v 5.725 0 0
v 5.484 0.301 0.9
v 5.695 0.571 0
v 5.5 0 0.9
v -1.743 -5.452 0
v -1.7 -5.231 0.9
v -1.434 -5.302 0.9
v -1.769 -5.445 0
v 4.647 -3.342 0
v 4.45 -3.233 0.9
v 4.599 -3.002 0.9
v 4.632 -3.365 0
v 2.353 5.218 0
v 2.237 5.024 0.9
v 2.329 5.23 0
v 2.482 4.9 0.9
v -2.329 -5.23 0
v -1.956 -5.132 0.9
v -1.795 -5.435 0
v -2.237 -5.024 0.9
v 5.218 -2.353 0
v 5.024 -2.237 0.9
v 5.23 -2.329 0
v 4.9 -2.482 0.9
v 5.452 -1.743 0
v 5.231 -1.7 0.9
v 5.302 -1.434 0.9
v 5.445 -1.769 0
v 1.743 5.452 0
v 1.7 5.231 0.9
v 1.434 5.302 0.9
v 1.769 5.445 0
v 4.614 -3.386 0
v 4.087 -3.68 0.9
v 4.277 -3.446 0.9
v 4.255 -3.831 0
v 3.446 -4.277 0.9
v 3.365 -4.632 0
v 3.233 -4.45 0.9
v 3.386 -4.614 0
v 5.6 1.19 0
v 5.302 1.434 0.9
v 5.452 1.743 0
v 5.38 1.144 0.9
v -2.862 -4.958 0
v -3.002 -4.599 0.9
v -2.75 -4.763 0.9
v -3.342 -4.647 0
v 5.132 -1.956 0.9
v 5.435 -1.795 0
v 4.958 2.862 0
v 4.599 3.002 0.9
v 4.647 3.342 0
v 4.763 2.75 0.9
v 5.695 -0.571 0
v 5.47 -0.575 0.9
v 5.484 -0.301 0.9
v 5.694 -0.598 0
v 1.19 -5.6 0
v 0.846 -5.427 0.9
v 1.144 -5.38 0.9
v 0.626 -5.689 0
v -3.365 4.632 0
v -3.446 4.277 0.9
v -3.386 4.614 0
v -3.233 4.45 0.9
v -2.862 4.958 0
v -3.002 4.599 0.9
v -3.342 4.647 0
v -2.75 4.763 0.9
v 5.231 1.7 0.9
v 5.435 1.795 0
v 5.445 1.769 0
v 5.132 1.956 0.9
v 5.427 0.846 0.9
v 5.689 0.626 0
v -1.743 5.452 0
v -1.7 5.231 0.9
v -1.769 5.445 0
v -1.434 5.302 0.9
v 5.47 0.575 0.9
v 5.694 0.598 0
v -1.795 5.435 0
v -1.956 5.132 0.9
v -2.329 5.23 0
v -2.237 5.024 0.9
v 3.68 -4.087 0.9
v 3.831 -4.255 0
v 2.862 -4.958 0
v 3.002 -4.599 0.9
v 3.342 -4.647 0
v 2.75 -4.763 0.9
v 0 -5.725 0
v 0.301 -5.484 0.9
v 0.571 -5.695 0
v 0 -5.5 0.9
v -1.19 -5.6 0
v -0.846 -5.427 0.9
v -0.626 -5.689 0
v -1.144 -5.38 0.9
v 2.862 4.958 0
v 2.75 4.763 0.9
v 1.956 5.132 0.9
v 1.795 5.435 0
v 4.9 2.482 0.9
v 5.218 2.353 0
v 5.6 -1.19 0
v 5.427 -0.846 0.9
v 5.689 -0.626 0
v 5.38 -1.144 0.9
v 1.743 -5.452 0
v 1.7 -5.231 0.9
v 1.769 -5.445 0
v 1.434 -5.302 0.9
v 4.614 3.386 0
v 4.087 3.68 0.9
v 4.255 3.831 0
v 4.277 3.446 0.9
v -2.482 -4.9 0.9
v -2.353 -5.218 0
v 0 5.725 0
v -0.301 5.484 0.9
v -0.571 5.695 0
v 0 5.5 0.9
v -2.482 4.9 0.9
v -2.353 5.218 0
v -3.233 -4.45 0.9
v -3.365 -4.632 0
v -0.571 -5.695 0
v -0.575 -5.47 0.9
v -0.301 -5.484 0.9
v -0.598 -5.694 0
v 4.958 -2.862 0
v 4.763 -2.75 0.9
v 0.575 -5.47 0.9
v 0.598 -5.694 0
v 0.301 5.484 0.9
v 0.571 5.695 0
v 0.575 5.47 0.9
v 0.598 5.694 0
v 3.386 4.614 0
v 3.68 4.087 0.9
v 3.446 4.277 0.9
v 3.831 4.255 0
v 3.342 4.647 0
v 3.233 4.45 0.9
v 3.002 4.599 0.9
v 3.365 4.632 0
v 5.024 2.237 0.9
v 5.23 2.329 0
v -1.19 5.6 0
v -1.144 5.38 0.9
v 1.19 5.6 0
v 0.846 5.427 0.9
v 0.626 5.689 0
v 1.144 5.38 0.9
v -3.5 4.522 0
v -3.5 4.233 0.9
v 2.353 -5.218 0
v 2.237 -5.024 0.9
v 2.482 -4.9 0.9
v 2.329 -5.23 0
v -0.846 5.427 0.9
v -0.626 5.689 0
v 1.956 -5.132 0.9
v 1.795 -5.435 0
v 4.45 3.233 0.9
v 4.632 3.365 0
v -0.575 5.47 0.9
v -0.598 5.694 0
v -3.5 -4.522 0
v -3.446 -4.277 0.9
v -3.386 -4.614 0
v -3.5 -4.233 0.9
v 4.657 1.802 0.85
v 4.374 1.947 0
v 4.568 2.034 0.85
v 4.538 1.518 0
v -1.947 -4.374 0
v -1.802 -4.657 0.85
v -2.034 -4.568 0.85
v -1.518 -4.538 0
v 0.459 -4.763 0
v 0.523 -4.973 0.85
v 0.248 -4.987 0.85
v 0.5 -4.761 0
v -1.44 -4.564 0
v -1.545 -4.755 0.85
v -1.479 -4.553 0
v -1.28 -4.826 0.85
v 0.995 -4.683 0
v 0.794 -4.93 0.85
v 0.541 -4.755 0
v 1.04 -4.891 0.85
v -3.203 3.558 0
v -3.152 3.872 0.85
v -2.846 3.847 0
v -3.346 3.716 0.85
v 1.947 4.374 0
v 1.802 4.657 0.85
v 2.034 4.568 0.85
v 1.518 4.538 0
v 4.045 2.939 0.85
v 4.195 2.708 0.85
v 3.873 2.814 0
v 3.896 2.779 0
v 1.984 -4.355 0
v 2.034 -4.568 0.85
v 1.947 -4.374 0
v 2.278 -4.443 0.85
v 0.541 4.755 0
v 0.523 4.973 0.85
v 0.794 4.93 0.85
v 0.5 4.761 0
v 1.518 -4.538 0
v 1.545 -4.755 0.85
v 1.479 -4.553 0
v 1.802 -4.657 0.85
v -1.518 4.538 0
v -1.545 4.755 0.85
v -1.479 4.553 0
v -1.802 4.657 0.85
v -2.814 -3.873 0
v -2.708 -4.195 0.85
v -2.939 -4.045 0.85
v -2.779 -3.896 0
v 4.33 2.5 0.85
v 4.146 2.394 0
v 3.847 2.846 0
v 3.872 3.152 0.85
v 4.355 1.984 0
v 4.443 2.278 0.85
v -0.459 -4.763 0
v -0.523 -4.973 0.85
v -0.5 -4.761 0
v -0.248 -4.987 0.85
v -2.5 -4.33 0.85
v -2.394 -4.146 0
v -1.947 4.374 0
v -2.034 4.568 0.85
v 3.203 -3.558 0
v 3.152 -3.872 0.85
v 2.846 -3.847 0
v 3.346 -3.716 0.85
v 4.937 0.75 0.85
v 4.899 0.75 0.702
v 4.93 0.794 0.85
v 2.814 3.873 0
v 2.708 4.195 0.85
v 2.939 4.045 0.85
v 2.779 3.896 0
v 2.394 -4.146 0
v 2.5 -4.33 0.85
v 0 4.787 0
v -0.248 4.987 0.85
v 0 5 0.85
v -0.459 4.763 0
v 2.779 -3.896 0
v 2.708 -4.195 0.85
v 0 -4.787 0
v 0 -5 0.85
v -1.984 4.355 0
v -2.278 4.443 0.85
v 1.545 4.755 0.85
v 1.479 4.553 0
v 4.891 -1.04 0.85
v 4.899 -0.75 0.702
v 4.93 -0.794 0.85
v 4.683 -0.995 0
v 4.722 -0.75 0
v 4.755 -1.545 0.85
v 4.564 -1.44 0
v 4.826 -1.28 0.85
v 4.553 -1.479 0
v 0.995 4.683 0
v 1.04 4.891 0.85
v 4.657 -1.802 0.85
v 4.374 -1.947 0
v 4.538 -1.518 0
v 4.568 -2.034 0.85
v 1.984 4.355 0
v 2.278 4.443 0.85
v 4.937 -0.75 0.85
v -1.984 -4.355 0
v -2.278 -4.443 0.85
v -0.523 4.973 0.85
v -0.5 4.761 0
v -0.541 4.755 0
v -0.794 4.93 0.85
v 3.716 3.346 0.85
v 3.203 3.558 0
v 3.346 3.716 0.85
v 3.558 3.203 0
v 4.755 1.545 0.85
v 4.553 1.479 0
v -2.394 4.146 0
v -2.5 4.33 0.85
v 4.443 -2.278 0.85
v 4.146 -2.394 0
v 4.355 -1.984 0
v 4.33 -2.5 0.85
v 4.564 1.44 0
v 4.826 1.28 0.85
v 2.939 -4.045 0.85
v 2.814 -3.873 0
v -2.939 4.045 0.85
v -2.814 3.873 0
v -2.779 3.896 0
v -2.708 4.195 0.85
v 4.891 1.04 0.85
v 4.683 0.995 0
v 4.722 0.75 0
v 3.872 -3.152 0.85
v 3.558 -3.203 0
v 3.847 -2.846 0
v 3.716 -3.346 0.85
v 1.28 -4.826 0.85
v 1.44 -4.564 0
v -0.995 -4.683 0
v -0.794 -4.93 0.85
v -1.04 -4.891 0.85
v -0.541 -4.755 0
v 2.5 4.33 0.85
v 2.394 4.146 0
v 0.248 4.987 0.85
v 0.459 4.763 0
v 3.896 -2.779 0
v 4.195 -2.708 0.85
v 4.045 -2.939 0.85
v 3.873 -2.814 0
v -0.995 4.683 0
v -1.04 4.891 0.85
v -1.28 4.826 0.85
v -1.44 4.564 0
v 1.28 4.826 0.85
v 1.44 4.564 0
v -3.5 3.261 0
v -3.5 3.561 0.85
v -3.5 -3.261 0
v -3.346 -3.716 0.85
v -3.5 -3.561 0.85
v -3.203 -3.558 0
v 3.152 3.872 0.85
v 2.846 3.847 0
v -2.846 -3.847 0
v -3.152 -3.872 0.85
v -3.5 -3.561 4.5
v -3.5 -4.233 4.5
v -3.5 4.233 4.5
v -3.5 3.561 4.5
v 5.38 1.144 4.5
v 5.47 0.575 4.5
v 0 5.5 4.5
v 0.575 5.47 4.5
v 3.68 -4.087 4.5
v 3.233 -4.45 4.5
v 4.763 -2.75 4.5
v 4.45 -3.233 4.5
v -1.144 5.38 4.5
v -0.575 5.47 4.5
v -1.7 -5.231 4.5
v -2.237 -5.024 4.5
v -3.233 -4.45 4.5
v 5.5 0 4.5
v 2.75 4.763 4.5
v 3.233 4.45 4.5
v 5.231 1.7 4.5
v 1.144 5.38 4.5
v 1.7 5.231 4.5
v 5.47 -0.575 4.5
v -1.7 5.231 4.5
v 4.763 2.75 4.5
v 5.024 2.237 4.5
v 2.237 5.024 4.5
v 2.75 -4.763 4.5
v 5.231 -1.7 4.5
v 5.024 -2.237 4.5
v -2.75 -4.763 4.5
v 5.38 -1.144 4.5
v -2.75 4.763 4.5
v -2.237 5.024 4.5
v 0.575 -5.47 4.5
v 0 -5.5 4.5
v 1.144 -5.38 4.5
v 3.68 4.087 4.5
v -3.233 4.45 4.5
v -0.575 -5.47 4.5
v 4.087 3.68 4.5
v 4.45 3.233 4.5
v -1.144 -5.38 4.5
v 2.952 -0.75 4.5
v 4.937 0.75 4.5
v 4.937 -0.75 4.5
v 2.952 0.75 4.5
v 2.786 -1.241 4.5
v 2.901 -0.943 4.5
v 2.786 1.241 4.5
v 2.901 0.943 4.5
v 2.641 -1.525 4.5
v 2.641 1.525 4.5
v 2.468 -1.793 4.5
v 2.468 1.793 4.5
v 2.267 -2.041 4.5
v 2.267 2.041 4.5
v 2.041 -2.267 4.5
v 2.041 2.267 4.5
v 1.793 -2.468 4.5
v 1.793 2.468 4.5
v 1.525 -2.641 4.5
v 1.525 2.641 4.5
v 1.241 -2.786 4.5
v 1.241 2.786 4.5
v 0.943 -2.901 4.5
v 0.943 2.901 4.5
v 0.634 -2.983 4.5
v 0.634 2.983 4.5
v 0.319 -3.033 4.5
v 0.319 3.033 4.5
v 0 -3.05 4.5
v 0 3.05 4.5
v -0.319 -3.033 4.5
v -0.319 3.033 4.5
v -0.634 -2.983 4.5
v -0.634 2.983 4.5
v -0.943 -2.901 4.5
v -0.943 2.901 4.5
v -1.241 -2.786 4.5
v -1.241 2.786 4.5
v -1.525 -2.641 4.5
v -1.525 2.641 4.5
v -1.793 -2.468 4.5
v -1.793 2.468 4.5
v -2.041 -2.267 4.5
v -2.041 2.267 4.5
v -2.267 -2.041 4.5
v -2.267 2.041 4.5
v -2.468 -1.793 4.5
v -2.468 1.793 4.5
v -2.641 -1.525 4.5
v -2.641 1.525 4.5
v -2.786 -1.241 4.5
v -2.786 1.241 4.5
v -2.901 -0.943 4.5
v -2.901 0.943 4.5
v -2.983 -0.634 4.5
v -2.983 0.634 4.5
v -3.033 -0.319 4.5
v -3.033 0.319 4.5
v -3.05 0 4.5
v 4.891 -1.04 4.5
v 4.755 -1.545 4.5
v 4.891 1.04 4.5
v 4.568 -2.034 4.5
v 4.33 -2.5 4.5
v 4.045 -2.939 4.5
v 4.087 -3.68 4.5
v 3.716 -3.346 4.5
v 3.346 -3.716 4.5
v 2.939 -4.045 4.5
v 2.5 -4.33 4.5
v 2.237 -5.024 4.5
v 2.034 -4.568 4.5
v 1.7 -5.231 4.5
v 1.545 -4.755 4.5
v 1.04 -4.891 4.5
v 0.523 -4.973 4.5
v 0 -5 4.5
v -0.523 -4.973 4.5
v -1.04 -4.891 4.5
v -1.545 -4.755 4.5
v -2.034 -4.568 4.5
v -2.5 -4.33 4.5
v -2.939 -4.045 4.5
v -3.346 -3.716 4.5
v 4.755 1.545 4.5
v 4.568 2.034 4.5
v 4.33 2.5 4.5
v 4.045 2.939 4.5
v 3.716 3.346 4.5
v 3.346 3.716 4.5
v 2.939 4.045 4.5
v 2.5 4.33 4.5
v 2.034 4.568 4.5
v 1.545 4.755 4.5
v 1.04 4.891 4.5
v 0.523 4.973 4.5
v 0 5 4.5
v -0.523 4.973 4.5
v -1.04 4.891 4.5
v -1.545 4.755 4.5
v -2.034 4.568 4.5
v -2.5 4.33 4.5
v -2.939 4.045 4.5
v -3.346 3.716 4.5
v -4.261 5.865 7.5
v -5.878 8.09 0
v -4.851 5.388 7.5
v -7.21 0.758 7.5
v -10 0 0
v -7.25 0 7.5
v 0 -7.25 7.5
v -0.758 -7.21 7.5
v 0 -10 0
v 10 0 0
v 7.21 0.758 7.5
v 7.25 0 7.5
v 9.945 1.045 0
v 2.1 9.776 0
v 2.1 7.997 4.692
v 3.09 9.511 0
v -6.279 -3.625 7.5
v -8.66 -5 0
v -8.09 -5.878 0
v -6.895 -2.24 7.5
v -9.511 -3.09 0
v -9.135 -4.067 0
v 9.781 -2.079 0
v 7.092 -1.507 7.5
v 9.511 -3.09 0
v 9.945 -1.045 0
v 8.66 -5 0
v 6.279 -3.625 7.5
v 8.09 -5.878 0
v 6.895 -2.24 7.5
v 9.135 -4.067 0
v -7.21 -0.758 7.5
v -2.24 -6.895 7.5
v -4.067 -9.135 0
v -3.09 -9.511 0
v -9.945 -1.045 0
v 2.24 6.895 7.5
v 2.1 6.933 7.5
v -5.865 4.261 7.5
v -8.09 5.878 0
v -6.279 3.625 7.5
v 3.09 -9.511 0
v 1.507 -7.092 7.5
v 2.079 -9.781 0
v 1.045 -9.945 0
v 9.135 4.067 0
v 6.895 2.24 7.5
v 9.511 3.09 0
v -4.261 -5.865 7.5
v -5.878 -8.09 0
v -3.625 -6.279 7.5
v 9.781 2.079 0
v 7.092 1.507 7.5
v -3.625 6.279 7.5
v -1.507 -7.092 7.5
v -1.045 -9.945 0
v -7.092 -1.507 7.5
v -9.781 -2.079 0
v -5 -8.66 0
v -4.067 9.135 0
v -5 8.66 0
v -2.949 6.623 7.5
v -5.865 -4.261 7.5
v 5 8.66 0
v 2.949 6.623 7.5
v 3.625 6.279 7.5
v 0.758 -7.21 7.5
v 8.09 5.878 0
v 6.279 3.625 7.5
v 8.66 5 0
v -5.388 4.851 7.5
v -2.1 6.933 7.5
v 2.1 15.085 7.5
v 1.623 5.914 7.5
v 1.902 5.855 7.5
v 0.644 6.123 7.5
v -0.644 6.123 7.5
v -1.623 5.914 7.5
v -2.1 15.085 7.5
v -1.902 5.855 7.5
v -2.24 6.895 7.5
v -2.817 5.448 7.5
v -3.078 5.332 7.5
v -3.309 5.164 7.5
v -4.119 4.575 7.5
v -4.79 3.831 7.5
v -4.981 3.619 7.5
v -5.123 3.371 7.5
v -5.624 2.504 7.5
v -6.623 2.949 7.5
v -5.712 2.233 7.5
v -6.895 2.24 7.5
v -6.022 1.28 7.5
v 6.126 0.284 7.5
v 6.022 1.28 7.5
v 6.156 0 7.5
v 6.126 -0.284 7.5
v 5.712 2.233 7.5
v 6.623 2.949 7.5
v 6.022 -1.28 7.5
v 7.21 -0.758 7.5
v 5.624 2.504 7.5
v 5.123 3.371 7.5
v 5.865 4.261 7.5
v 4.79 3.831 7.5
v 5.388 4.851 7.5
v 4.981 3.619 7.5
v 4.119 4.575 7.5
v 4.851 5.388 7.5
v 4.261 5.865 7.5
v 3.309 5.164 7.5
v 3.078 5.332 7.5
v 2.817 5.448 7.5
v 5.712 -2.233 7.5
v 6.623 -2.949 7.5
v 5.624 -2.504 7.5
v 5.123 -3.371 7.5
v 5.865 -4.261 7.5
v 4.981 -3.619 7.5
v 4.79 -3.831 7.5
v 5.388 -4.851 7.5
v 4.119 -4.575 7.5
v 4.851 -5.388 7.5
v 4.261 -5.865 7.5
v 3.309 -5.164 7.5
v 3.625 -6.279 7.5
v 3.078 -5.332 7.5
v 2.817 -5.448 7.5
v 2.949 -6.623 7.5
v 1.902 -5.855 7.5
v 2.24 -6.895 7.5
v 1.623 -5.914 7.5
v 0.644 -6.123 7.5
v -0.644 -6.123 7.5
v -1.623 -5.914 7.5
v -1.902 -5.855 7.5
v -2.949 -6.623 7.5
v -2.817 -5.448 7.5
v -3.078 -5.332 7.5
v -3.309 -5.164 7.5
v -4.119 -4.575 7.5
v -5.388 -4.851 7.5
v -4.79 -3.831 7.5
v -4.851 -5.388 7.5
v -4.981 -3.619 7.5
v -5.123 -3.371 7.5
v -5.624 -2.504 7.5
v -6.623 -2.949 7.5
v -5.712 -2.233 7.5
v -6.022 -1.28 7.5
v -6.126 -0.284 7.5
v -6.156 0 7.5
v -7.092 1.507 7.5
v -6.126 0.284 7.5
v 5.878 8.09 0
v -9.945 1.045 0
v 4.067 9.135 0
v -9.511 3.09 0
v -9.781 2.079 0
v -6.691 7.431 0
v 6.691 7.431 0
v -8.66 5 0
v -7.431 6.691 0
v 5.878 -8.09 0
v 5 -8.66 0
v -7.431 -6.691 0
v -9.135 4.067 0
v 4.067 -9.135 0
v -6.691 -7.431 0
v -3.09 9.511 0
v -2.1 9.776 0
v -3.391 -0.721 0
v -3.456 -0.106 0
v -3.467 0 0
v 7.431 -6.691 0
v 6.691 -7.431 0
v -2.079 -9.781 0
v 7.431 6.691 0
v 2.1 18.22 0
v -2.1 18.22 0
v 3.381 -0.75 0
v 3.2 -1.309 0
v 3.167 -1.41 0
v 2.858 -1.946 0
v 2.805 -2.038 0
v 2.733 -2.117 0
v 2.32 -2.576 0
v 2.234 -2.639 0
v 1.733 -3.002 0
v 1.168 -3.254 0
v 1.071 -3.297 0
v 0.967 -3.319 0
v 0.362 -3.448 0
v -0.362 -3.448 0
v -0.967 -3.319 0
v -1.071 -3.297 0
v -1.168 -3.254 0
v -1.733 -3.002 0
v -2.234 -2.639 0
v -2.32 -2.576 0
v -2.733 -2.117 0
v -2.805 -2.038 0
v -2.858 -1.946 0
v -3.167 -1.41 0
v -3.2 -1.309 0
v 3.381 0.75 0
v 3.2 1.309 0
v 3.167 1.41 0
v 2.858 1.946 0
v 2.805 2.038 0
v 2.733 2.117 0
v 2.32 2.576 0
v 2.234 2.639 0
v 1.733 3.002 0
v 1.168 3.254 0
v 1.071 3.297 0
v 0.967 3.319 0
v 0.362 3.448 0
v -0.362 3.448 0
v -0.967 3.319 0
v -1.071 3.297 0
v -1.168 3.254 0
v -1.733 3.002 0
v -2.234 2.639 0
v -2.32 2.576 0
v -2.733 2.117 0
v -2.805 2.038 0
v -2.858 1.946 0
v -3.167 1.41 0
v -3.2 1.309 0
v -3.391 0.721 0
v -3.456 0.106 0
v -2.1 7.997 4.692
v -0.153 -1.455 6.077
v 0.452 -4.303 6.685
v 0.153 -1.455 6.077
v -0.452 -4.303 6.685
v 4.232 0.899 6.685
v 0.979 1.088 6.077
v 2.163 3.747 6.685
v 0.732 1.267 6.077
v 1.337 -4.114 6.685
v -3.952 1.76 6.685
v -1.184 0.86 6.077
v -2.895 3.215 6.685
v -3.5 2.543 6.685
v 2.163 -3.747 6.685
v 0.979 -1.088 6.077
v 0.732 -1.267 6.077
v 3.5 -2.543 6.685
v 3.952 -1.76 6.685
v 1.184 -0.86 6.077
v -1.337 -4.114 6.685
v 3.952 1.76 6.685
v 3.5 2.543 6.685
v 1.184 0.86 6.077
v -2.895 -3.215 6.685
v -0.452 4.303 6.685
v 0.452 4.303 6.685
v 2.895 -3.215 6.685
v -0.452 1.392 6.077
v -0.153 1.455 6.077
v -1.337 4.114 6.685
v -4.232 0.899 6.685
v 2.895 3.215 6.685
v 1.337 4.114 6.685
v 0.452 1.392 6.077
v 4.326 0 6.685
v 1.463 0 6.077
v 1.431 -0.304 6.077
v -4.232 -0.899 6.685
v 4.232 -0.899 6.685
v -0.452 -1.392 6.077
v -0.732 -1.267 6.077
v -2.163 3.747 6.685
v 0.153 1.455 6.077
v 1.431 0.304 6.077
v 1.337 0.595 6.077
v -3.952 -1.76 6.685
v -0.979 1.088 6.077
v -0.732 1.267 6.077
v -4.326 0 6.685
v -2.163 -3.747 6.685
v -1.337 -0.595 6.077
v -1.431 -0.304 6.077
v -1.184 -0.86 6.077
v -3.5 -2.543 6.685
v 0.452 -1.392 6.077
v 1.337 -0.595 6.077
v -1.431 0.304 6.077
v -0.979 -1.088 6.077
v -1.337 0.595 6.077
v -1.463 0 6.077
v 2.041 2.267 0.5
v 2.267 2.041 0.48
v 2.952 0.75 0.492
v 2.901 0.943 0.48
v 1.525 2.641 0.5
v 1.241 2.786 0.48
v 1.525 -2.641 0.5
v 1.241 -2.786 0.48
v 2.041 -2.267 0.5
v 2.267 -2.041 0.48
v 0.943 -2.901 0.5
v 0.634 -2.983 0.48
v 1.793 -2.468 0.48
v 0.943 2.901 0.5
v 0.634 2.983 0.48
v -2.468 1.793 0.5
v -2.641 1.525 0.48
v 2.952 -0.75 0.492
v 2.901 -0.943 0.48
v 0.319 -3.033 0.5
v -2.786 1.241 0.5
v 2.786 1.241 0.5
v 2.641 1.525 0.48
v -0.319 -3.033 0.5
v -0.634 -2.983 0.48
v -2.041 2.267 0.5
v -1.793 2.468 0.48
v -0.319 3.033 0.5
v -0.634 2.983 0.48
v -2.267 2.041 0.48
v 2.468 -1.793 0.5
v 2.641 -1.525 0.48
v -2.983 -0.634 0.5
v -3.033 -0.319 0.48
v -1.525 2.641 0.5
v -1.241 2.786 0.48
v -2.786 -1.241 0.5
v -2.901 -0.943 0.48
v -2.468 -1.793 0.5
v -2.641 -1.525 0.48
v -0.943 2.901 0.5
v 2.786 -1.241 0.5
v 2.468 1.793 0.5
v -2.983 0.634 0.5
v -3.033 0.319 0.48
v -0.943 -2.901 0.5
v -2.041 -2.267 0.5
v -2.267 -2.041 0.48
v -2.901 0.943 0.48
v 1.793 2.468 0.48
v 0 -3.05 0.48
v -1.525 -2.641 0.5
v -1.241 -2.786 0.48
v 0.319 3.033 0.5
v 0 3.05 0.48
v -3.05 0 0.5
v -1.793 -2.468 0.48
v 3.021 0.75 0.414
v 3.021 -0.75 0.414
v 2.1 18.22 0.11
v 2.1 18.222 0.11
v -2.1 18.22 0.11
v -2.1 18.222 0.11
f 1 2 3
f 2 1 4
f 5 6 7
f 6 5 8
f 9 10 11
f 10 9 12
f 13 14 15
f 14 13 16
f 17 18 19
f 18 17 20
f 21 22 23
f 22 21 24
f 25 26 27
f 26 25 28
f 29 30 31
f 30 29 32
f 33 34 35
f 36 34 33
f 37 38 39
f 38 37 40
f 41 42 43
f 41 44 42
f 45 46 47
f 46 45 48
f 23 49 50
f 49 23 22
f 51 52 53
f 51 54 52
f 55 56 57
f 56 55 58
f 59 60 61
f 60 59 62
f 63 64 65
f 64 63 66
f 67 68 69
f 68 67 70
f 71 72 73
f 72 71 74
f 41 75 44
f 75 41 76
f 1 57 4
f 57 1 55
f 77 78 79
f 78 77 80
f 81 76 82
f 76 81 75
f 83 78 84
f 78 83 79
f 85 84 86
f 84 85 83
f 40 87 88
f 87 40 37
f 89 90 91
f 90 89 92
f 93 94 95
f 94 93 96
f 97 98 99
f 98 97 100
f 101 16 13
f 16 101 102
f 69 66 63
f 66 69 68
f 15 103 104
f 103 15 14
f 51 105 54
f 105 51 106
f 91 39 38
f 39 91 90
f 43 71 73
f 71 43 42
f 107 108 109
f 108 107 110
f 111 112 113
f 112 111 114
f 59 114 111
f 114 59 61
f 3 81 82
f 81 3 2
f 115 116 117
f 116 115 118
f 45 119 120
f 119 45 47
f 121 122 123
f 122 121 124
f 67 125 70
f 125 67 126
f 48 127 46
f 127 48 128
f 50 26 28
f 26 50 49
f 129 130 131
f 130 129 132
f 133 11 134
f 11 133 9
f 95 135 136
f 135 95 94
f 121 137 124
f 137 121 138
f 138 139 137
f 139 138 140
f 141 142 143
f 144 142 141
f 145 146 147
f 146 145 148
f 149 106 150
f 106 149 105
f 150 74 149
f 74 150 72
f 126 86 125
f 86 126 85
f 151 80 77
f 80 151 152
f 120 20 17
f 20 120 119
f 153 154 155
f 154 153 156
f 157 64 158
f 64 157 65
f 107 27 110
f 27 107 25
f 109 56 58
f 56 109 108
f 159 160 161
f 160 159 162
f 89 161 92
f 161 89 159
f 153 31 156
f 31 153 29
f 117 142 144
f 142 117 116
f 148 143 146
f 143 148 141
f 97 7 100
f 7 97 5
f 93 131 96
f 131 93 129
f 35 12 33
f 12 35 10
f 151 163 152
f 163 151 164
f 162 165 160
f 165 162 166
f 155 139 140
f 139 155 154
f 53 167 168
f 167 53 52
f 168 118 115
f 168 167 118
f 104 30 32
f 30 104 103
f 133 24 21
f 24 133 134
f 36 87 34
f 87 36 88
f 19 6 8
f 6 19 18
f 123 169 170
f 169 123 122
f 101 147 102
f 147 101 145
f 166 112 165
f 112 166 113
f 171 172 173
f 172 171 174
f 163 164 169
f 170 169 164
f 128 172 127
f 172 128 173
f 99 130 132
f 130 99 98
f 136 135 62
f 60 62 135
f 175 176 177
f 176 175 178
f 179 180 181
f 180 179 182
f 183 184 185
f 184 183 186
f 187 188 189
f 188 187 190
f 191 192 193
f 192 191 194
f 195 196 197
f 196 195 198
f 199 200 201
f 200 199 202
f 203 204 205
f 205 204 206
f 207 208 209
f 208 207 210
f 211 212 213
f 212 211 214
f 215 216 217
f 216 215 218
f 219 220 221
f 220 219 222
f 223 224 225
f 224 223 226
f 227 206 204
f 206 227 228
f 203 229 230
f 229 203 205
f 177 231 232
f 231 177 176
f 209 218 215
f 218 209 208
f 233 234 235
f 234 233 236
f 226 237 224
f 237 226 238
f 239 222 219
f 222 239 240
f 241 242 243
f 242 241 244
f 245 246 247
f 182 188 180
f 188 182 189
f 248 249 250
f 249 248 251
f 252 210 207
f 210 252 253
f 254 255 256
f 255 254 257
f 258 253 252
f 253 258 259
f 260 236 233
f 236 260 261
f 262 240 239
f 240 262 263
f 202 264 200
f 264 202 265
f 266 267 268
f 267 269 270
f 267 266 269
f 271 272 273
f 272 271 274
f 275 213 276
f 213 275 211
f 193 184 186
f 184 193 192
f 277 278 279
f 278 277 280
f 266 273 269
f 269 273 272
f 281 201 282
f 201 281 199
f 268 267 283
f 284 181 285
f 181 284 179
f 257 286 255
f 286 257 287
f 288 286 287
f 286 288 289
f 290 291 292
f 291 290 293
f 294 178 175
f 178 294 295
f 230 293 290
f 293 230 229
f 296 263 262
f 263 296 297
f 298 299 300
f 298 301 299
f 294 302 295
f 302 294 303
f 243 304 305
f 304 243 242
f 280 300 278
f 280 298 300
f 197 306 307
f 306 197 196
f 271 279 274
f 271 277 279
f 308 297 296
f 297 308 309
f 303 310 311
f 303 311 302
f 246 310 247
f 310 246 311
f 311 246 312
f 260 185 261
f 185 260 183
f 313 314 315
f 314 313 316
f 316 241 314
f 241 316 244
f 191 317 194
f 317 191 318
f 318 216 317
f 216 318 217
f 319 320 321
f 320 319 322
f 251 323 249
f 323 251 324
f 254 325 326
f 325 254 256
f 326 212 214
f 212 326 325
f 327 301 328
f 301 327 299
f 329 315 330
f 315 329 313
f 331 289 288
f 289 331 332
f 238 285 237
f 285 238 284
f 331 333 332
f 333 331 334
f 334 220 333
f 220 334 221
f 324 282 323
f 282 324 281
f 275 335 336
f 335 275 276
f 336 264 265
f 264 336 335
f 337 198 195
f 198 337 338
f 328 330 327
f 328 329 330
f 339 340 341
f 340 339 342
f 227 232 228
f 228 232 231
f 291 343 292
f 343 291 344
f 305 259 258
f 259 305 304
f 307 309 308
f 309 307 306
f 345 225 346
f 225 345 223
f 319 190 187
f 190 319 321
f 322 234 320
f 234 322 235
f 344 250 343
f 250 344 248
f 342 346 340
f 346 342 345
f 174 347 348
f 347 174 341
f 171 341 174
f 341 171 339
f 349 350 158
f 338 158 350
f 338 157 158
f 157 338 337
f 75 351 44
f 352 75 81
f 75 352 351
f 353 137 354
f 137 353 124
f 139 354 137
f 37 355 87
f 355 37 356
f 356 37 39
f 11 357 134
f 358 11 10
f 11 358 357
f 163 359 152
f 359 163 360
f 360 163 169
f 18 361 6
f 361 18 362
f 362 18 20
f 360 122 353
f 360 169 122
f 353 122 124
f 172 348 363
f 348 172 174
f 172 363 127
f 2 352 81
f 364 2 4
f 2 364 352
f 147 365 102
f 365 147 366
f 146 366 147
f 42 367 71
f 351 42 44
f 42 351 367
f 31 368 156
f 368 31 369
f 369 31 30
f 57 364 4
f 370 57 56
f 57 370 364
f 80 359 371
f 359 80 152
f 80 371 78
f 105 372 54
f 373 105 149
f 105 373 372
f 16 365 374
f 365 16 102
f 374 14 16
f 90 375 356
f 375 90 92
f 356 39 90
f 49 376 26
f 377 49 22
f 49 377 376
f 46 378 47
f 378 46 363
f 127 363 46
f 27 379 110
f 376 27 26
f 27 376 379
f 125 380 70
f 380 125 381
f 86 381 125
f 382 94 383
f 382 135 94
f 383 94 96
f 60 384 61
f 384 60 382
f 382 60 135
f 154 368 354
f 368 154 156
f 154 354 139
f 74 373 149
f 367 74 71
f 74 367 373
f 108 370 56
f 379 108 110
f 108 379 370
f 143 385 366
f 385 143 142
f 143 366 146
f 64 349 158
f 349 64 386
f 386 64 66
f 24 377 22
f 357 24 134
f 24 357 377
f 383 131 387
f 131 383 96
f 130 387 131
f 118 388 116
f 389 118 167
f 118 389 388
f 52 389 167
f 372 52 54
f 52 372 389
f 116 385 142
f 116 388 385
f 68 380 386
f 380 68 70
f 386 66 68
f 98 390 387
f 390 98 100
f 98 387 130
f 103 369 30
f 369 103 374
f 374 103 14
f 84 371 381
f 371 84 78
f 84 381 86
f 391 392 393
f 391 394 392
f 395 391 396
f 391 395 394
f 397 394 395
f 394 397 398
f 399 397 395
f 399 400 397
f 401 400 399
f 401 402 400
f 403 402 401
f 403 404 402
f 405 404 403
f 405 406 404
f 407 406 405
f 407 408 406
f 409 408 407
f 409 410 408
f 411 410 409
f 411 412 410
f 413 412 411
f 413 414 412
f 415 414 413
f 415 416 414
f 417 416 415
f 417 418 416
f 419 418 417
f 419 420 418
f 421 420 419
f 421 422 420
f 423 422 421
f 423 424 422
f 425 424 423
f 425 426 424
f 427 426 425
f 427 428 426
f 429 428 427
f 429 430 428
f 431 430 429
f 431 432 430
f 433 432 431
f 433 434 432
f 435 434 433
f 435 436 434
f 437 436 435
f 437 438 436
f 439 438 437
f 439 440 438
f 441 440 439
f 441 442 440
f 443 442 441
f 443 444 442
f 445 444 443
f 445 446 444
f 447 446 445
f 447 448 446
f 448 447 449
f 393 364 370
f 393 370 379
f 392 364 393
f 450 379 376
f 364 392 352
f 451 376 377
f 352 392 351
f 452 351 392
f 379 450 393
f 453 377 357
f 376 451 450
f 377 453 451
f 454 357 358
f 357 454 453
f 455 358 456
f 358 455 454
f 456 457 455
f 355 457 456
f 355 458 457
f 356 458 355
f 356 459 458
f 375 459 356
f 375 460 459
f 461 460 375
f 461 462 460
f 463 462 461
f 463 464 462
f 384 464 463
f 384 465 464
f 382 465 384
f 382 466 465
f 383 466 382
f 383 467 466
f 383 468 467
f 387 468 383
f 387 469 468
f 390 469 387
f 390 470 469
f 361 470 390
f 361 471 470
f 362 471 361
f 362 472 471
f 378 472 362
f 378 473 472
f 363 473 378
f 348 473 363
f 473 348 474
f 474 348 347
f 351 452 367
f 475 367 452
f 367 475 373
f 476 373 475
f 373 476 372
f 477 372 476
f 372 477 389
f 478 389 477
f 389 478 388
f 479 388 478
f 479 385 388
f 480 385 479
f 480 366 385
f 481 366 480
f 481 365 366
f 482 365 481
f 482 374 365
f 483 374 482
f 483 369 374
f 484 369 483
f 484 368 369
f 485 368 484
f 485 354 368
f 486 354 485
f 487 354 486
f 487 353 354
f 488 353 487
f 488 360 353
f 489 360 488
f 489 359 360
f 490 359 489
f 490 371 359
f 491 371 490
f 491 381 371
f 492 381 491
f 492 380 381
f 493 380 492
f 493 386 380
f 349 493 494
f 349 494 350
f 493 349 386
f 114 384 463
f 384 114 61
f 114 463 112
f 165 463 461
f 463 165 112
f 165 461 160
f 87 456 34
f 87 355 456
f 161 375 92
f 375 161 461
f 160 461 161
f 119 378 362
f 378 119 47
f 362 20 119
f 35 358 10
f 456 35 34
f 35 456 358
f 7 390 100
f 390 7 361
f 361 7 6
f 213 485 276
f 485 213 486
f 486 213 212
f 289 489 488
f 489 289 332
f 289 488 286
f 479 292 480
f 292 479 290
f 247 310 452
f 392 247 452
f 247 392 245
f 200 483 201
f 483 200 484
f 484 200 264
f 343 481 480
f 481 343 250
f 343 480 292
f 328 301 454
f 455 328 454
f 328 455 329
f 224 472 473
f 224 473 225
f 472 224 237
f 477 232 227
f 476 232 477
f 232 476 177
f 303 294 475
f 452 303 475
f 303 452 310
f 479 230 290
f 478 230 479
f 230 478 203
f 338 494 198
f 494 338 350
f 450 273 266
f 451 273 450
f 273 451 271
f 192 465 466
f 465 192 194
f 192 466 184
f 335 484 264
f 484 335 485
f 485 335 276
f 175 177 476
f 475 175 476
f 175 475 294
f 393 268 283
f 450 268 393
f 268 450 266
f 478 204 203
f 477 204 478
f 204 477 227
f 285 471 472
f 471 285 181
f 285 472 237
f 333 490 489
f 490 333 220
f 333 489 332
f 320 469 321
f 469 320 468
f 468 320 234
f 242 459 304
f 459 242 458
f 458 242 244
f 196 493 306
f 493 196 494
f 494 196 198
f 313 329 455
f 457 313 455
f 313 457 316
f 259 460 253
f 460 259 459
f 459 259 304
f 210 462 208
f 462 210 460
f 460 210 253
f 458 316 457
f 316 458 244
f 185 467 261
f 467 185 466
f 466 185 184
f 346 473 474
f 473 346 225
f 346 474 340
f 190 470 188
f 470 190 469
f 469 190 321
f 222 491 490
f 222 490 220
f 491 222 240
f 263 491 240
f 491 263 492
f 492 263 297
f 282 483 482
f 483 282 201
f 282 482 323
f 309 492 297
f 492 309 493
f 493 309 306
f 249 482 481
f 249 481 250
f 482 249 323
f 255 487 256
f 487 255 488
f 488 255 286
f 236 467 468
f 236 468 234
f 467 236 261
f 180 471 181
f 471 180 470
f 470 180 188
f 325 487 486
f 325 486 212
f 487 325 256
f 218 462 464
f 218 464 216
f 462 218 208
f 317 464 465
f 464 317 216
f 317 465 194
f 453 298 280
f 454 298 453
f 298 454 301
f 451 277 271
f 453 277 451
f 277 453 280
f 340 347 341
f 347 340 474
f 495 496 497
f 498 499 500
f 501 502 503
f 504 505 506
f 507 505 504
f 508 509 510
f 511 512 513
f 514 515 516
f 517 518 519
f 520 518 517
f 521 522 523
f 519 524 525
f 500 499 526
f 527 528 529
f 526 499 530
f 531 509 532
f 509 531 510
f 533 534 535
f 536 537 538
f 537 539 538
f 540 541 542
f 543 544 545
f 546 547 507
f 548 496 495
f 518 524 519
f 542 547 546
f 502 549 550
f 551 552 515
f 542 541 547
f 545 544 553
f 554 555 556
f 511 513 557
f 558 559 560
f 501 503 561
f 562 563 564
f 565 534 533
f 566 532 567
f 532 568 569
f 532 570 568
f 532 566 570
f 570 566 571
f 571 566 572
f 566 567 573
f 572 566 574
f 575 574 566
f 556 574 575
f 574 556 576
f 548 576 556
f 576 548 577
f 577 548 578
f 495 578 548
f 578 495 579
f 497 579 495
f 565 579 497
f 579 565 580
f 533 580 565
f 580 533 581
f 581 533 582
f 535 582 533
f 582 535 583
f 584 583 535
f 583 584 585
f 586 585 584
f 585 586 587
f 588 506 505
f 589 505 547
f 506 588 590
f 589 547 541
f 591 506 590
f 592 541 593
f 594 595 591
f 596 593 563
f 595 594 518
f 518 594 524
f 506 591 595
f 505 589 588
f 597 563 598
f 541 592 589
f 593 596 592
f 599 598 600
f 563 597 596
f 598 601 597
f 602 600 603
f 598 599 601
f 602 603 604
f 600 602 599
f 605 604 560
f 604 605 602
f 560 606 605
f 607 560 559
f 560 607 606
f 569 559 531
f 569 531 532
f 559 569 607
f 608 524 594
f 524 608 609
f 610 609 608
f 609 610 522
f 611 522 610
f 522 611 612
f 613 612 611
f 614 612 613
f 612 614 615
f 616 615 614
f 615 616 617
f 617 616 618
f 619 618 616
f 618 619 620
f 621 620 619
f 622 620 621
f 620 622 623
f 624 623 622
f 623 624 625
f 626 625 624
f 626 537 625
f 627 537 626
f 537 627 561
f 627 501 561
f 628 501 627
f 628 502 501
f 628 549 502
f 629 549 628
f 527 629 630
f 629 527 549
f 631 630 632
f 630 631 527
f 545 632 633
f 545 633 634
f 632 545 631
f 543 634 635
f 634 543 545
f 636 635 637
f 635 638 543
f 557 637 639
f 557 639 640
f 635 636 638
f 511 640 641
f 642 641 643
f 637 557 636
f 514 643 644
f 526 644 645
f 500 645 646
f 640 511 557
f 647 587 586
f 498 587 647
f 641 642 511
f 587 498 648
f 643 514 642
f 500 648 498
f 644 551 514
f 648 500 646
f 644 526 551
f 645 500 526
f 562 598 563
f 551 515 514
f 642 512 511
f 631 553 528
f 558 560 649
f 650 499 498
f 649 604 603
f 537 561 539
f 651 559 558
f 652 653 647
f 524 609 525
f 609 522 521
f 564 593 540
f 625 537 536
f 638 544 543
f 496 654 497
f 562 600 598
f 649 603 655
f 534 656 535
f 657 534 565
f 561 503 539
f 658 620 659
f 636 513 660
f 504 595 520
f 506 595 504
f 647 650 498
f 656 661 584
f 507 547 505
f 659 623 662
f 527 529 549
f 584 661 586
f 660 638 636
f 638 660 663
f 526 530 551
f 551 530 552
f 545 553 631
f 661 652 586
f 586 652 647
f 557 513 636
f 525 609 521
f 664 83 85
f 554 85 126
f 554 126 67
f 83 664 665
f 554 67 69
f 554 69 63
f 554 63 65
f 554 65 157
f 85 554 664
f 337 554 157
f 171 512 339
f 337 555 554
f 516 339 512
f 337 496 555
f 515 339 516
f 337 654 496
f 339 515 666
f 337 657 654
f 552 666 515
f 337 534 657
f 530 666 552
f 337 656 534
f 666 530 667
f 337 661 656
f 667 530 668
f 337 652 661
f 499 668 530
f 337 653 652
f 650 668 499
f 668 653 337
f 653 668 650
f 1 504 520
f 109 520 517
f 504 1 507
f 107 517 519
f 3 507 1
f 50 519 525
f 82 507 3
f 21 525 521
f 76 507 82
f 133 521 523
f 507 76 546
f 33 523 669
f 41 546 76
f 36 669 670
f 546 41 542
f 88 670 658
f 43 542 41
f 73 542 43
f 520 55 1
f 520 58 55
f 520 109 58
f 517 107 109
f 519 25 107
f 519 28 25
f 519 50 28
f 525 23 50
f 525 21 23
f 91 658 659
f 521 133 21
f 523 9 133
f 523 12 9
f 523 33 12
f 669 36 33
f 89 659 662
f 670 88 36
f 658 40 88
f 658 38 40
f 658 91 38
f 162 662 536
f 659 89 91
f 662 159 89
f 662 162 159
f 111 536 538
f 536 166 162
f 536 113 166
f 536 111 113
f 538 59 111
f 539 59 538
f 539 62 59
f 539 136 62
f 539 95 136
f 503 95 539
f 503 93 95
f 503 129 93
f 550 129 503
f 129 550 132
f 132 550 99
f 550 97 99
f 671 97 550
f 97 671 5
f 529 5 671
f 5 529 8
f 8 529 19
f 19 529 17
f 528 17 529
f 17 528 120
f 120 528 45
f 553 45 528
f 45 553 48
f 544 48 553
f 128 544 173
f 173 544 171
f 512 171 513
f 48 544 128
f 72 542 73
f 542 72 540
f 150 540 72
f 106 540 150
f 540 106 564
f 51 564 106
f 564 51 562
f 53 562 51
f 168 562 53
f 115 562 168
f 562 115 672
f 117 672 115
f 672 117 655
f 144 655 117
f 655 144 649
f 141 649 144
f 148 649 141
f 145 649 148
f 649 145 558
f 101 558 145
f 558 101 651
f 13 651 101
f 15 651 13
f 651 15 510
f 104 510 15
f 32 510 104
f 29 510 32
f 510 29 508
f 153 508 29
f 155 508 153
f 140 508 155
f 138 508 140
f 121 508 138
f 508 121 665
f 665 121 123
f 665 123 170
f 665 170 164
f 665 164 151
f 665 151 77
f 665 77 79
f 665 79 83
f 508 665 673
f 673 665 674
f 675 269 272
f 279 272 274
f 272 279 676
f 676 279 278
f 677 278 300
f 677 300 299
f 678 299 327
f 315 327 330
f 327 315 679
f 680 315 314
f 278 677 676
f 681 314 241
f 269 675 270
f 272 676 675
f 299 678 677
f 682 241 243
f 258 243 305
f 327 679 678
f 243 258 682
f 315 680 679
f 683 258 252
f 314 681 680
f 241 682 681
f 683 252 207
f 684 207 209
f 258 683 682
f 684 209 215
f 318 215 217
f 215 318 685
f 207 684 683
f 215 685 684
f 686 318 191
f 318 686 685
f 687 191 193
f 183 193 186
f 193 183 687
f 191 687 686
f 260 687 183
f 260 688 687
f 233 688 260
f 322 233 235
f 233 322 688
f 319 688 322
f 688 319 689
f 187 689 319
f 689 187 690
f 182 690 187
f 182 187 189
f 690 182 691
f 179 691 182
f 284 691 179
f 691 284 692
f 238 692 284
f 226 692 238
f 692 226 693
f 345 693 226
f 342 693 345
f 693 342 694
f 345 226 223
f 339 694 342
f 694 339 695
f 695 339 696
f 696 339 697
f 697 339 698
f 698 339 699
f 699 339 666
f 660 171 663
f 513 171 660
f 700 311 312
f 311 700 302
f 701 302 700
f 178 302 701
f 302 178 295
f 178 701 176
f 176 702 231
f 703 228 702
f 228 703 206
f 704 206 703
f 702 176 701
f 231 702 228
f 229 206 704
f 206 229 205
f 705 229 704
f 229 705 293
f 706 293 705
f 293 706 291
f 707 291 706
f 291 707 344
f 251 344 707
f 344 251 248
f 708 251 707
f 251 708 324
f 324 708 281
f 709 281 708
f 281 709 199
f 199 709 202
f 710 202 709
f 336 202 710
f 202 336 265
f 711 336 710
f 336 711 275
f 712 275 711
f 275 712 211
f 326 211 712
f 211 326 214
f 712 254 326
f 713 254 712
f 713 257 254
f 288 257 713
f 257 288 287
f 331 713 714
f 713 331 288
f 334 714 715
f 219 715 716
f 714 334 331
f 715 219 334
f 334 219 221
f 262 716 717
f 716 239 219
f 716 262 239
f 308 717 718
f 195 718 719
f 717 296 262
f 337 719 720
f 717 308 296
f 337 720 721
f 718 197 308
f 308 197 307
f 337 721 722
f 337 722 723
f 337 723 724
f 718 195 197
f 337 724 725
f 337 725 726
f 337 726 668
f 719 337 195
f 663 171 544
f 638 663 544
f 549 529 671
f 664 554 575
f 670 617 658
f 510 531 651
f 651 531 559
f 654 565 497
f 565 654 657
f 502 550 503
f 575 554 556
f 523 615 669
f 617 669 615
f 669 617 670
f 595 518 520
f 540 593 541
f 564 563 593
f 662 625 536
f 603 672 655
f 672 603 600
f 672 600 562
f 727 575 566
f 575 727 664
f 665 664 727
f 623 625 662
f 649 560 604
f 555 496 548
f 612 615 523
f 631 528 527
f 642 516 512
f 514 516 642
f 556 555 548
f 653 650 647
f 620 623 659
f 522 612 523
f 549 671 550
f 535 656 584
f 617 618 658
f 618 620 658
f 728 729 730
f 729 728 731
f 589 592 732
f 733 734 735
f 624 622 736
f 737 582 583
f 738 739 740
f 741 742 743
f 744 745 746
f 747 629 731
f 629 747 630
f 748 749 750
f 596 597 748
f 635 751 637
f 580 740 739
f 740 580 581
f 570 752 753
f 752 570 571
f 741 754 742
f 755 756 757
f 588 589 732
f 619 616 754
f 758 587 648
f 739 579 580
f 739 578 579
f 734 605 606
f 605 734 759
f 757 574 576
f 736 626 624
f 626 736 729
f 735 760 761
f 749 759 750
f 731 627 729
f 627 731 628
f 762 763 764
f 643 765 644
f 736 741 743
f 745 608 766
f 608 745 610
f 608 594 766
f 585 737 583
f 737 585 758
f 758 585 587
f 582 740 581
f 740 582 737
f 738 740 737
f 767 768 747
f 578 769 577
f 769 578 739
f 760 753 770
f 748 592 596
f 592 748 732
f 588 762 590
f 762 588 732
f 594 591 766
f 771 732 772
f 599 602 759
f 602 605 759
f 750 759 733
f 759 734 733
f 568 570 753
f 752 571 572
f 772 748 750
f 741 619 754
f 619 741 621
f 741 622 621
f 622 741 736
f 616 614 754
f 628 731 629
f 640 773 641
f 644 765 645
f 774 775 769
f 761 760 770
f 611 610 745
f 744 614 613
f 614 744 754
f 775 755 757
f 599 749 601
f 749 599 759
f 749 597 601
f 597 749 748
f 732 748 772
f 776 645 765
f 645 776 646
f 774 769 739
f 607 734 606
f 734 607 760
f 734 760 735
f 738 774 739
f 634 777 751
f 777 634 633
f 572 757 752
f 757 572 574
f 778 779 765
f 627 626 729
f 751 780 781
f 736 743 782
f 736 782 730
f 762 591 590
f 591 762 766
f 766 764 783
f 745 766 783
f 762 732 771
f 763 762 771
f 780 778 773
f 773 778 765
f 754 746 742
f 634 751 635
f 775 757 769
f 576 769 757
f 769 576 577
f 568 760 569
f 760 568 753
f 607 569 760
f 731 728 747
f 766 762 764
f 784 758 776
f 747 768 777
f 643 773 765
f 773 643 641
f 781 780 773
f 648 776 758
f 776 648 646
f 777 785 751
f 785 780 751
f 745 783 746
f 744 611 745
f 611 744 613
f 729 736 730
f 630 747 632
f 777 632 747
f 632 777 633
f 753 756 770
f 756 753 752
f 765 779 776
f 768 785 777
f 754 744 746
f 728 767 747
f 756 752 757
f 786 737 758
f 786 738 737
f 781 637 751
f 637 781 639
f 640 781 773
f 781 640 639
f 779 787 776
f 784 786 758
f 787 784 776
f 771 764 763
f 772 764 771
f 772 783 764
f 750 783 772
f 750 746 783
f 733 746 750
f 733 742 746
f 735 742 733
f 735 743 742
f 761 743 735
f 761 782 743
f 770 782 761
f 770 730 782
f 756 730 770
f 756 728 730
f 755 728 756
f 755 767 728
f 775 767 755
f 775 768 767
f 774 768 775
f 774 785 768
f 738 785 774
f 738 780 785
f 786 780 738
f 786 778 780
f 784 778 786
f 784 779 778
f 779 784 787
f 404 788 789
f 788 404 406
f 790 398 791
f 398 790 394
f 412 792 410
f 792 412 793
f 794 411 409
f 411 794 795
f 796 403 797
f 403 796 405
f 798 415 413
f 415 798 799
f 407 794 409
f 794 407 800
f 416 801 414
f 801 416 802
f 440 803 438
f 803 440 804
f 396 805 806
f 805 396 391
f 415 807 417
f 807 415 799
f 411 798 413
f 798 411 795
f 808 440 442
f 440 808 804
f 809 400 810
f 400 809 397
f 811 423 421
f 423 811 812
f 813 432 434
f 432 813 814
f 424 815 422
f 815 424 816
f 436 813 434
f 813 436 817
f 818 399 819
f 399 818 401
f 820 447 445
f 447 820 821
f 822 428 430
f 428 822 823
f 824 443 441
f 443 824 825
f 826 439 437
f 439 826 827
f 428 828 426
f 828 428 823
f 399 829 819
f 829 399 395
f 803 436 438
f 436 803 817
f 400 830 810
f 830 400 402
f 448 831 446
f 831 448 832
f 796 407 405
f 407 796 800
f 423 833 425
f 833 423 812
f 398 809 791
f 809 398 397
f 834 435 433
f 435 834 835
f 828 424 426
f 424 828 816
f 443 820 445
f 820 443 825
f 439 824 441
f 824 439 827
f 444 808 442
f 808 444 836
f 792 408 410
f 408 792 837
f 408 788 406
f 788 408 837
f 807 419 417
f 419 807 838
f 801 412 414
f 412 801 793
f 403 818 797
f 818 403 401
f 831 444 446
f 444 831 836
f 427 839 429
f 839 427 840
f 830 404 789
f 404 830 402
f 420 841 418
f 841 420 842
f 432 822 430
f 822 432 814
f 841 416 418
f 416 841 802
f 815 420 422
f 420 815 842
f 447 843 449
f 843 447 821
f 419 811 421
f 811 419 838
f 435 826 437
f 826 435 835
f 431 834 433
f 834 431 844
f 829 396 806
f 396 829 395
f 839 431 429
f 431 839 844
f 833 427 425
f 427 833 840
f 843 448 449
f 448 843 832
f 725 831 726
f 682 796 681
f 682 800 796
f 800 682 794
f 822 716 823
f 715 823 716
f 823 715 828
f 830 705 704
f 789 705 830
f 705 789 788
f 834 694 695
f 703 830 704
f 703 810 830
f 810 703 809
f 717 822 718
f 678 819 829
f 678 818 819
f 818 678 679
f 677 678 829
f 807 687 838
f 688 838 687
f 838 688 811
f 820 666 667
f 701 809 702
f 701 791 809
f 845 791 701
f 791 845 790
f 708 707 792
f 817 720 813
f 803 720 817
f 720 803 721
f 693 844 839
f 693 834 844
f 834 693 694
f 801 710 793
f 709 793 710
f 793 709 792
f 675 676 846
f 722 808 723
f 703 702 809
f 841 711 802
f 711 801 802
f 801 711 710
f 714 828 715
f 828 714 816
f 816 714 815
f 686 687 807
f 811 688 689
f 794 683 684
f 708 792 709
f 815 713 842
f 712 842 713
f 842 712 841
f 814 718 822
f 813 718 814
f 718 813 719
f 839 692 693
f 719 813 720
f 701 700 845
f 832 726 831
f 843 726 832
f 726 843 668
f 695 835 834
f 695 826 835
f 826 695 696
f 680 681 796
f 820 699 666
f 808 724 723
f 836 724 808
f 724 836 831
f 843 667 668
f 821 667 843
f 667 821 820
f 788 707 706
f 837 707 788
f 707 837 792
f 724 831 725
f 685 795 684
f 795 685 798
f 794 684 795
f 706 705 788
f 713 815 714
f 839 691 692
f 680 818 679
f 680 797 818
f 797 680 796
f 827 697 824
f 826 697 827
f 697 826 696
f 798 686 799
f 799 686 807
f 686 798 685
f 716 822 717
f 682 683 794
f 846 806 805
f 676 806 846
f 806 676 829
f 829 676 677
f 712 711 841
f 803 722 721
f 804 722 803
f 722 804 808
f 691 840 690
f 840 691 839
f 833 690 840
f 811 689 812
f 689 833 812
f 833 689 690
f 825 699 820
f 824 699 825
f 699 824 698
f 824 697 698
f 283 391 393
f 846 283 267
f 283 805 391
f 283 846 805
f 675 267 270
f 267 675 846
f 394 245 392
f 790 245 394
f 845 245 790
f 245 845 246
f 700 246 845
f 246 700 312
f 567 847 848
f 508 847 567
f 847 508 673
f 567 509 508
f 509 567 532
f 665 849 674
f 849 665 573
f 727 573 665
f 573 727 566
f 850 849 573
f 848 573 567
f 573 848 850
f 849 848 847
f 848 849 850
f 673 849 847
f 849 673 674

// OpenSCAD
// PRUSA iteration3
// LCDKnob
// GNU GPLv3
// Josef Průša <iam@josefprusa.cz> and contributors
// http://www.reprap.org/wiki/Prusa_Mendel
// http://prusamendel.org

difference(){
    // main body
    translate([0,0,0]) rotate(a=[0,0,0]) cylinder(h=7.5,r1=10,r2=7.25,$fn=60);

    translate([0,0,20]) rotate(a=[0,0,0]) sphere(14);

    // knob cutout
    translate([0,0,-0.1]) rotate(a=[0,0,0]) cylinder(h=4.6,d=6.1,$fn=60);

    translate([0,0,-0.1]) rotate(a=[0,0,0]) cylinder(h=0.6,d1=7.1,d2=6.1,$fn=30);

    translate([0,0.75,-0.1]) rotate(a=[0,0,-90]) cube([1.5,5.3,4.6]);

    // first layer correction
    union(){
        difference(){
            translate([0,0,-0.1]) rotate([0,0,0]) cylinder(h=2,d1=11.5,d2=10.5,$fn=60);
            translate([0,0,-0.15]) rotate([0,0,0]) cylinder(h=2,d1=9.5,d2=10.5,$fn=60);
            translate([0,0,1]) rotate([0,0,0]) cylinder(h=2,d=13,$fn=30);
            translate([-13.5,-6,-0.1]) rotate([0,0,0]) cube([10,12,4.6]);
        }
    }
    difference(){
        translate([0,0,-0.1]) rotate([0,0,0]) cylinder(h=4.6,d=11,$fn=60);
        translate([0,0,-0.1]) rotate([0,0,0]) cylinder(h=4.6,d=10,$fn=60);
        translate([-13.5,-6,-0.1]) rotate([0,0,0]) cube([10,12,4.6]);
    }
}

// handle
difference(){
    translate([-2.1,6.5,0]) rotate([0,0,0]) cube([4.2,12,7.5]);
    translate([-2.5,15,7.7]) rotate([-67,0,0]) cube([5.5,11,7.5]);
    translate([-2.2,18.22,-0.1]) rotate([0,0,0]) cube([4.4,12,0.21]);
}
